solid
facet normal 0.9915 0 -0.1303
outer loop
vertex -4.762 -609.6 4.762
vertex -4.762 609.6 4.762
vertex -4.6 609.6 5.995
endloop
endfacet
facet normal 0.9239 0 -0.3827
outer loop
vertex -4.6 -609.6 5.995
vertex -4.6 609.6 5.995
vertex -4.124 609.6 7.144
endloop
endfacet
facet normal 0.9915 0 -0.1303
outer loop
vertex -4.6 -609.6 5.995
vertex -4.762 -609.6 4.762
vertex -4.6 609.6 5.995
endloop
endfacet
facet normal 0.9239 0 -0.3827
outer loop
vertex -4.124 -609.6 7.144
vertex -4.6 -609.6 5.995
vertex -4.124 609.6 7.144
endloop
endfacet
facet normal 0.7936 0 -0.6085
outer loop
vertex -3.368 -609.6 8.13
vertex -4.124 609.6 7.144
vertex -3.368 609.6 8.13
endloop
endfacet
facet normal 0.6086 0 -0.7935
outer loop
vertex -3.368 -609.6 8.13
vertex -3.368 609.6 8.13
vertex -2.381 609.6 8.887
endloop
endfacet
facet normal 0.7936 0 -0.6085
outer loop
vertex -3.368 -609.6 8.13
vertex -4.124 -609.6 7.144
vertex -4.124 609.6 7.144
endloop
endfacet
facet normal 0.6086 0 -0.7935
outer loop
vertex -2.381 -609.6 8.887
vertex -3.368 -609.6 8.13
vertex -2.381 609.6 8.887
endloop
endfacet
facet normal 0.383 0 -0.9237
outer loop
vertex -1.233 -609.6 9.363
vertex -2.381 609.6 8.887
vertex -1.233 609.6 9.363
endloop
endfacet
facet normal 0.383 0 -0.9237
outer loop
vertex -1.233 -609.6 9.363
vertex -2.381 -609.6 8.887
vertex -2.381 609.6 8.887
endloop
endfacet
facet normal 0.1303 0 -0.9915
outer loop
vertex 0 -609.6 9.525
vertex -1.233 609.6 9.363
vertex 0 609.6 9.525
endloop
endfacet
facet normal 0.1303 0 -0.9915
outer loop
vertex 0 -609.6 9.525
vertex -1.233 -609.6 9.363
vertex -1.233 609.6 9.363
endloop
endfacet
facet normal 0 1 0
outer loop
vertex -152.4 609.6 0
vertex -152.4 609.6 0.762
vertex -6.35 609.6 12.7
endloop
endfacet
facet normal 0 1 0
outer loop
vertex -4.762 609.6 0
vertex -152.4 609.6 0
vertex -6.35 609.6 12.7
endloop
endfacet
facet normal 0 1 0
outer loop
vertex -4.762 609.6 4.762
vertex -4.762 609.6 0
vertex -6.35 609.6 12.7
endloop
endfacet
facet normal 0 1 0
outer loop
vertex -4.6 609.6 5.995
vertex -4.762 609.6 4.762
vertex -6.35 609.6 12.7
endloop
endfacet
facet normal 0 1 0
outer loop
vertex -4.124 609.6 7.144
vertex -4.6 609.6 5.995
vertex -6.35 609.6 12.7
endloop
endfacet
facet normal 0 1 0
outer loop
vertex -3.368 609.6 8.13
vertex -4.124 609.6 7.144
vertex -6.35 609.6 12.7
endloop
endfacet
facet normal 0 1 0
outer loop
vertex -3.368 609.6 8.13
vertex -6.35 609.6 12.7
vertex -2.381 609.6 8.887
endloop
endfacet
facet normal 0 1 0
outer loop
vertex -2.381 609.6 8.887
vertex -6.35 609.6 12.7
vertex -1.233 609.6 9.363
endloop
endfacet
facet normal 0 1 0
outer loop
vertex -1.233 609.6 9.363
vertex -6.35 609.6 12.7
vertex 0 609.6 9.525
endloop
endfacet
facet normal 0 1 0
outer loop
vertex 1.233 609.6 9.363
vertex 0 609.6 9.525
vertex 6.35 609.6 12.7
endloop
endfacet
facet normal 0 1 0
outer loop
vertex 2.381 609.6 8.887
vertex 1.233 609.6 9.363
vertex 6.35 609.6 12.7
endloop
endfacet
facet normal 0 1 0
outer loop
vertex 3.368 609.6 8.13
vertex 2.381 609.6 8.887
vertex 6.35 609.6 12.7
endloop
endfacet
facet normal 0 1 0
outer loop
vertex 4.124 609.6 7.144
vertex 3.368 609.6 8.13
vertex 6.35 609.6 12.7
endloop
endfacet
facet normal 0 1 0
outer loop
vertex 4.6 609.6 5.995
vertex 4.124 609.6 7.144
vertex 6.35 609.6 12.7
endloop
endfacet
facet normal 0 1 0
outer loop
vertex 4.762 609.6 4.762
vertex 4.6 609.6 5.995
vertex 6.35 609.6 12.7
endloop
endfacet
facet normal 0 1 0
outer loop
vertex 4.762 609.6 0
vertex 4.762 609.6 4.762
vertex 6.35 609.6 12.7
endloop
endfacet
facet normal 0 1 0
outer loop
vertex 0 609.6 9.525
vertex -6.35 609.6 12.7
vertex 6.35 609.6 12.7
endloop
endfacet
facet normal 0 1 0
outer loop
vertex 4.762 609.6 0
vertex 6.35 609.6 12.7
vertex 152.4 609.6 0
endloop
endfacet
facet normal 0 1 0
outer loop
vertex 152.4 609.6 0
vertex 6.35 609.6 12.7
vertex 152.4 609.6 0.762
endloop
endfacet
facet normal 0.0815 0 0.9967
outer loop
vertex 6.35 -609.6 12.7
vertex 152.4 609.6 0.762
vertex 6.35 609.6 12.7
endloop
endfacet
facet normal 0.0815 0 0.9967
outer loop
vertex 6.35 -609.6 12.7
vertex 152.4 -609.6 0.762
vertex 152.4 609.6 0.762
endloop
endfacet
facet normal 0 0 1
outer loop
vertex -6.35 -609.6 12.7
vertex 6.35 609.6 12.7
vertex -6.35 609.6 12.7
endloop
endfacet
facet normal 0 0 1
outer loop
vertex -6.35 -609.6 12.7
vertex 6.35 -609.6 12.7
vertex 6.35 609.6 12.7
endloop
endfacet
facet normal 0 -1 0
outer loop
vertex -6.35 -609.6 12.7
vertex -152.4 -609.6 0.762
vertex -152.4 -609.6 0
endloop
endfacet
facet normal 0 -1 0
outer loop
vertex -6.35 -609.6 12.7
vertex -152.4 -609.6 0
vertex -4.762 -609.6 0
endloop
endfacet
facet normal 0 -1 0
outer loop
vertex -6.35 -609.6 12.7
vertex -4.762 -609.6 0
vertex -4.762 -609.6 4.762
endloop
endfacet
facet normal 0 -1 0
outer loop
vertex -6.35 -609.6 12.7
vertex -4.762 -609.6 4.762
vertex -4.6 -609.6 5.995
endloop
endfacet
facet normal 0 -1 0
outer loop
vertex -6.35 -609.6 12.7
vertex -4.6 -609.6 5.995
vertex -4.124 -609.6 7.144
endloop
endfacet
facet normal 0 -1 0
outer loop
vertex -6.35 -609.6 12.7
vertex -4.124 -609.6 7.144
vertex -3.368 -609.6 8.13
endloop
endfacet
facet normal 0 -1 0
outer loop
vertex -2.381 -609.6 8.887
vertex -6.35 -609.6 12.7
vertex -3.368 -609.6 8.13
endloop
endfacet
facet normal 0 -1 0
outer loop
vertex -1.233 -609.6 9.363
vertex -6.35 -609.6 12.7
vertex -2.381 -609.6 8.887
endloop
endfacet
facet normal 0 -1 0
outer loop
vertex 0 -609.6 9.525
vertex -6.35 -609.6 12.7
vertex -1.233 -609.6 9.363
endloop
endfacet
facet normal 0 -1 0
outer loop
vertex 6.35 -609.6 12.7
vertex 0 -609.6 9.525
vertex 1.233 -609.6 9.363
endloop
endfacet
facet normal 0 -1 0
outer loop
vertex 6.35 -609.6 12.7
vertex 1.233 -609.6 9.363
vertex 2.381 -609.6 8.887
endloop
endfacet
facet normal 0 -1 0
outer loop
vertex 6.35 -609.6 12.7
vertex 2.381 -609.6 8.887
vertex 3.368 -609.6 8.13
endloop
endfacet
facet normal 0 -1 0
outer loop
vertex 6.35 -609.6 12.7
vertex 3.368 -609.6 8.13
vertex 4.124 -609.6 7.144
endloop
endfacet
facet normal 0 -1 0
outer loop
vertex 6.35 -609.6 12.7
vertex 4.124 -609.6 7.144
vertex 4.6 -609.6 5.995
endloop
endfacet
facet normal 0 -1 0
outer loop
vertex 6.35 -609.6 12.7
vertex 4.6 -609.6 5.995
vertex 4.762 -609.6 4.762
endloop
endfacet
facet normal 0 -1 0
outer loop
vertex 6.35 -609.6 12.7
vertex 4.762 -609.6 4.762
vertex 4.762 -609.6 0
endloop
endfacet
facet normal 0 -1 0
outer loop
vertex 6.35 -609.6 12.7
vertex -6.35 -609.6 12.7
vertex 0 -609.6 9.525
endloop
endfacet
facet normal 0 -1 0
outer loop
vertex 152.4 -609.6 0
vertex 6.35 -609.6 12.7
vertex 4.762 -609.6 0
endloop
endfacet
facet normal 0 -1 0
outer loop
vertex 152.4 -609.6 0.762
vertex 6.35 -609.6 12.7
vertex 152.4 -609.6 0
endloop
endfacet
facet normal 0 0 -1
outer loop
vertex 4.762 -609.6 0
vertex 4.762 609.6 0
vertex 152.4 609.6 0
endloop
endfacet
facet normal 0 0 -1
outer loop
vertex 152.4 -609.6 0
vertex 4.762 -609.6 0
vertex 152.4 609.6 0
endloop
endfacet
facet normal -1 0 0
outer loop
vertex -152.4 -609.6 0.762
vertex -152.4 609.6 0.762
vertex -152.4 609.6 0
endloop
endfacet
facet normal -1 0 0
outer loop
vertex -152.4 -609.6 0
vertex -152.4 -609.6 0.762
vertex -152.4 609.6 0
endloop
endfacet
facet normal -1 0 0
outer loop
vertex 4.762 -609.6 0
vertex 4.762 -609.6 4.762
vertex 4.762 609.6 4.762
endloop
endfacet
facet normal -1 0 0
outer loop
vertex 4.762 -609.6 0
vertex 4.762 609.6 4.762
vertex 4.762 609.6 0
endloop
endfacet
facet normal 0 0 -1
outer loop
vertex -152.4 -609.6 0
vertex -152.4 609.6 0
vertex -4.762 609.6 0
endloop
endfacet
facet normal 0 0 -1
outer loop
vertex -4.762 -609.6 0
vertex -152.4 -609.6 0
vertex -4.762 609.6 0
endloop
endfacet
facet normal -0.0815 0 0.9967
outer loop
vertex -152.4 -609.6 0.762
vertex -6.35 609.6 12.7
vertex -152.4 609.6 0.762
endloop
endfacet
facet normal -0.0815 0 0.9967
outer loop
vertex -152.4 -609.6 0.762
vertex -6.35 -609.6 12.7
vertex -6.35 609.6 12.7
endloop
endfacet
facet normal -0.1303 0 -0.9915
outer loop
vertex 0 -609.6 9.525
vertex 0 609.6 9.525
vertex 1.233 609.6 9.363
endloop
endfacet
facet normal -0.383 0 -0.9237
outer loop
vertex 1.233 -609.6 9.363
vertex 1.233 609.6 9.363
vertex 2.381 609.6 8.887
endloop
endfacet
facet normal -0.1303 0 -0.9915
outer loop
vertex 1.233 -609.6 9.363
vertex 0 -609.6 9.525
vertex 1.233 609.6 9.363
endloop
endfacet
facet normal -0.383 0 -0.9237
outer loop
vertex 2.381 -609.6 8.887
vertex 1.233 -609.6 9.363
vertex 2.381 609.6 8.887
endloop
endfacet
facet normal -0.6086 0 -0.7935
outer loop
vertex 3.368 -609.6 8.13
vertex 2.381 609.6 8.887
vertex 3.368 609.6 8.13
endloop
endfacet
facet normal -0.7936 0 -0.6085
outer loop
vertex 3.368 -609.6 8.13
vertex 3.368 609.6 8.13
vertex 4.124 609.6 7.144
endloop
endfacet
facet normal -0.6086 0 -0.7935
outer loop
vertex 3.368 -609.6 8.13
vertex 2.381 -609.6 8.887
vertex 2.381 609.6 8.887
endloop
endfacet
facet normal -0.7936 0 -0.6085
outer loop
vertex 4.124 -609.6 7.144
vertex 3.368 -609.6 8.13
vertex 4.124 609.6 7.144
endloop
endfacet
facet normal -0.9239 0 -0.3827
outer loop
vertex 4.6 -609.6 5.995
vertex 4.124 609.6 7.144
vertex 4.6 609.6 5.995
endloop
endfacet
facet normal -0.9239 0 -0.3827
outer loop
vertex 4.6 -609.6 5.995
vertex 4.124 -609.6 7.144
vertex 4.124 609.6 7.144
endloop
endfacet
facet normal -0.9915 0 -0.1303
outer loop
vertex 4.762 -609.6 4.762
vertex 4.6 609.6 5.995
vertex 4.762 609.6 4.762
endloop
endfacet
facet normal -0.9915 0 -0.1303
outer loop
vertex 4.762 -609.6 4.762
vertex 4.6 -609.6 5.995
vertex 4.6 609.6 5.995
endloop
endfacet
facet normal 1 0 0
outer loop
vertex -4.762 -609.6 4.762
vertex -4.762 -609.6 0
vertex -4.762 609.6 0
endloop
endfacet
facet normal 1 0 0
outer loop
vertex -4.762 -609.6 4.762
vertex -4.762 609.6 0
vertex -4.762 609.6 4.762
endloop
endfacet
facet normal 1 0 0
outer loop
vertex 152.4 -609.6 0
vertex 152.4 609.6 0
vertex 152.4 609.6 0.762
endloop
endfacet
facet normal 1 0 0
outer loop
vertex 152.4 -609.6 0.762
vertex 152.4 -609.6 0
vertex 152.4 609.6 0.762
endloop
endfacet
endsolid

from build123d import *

# Parameters (mm, degrees)
F1_DEPTH = 609.6


with BuildPart() as f1:
    # F0 (on Front) → F1 (new body, symmetric)
    with BuildSketch(Plane.XZ):
        with BuildLine():
            Line((0, 9.525), (0, 12.7))
            Line((0, 12.7), (-6.35, 12.7))
            Line((-6.35, 12.7), (-152.4, 0.762))
            Line((-152.4, 0.762), (-152.4, 0))
            Line((-152.4, 0), (-4.7625, 0))
            Line((-4.7625, 0), (-4.7625, 4.7625))
            ThreePointArc((-4.7625, 4.7625), (-3.367596, 8.130096), (0, 9.525))
        make_face()
        with BuildLine():
            Line((6.35, 12.7), (0, 12.7))
            Line((0, 12.7), (0, 9.525))
            ThreePointArc((0, 9.525), (3.367596, 8.130096), (4.7625, 4.7625))
            Line((4.7625, 4.7625), (4.7625, 0))
            Line((4.7625, 0), (152.4, 0))
            Line((152.4, 0), (152.4, 0.762))
            Line((152.4, 0.762), (6.35, 12.7))
        make_face()
    extrude(amount=F1_DEPTH, both=True)


solid = f1.part
